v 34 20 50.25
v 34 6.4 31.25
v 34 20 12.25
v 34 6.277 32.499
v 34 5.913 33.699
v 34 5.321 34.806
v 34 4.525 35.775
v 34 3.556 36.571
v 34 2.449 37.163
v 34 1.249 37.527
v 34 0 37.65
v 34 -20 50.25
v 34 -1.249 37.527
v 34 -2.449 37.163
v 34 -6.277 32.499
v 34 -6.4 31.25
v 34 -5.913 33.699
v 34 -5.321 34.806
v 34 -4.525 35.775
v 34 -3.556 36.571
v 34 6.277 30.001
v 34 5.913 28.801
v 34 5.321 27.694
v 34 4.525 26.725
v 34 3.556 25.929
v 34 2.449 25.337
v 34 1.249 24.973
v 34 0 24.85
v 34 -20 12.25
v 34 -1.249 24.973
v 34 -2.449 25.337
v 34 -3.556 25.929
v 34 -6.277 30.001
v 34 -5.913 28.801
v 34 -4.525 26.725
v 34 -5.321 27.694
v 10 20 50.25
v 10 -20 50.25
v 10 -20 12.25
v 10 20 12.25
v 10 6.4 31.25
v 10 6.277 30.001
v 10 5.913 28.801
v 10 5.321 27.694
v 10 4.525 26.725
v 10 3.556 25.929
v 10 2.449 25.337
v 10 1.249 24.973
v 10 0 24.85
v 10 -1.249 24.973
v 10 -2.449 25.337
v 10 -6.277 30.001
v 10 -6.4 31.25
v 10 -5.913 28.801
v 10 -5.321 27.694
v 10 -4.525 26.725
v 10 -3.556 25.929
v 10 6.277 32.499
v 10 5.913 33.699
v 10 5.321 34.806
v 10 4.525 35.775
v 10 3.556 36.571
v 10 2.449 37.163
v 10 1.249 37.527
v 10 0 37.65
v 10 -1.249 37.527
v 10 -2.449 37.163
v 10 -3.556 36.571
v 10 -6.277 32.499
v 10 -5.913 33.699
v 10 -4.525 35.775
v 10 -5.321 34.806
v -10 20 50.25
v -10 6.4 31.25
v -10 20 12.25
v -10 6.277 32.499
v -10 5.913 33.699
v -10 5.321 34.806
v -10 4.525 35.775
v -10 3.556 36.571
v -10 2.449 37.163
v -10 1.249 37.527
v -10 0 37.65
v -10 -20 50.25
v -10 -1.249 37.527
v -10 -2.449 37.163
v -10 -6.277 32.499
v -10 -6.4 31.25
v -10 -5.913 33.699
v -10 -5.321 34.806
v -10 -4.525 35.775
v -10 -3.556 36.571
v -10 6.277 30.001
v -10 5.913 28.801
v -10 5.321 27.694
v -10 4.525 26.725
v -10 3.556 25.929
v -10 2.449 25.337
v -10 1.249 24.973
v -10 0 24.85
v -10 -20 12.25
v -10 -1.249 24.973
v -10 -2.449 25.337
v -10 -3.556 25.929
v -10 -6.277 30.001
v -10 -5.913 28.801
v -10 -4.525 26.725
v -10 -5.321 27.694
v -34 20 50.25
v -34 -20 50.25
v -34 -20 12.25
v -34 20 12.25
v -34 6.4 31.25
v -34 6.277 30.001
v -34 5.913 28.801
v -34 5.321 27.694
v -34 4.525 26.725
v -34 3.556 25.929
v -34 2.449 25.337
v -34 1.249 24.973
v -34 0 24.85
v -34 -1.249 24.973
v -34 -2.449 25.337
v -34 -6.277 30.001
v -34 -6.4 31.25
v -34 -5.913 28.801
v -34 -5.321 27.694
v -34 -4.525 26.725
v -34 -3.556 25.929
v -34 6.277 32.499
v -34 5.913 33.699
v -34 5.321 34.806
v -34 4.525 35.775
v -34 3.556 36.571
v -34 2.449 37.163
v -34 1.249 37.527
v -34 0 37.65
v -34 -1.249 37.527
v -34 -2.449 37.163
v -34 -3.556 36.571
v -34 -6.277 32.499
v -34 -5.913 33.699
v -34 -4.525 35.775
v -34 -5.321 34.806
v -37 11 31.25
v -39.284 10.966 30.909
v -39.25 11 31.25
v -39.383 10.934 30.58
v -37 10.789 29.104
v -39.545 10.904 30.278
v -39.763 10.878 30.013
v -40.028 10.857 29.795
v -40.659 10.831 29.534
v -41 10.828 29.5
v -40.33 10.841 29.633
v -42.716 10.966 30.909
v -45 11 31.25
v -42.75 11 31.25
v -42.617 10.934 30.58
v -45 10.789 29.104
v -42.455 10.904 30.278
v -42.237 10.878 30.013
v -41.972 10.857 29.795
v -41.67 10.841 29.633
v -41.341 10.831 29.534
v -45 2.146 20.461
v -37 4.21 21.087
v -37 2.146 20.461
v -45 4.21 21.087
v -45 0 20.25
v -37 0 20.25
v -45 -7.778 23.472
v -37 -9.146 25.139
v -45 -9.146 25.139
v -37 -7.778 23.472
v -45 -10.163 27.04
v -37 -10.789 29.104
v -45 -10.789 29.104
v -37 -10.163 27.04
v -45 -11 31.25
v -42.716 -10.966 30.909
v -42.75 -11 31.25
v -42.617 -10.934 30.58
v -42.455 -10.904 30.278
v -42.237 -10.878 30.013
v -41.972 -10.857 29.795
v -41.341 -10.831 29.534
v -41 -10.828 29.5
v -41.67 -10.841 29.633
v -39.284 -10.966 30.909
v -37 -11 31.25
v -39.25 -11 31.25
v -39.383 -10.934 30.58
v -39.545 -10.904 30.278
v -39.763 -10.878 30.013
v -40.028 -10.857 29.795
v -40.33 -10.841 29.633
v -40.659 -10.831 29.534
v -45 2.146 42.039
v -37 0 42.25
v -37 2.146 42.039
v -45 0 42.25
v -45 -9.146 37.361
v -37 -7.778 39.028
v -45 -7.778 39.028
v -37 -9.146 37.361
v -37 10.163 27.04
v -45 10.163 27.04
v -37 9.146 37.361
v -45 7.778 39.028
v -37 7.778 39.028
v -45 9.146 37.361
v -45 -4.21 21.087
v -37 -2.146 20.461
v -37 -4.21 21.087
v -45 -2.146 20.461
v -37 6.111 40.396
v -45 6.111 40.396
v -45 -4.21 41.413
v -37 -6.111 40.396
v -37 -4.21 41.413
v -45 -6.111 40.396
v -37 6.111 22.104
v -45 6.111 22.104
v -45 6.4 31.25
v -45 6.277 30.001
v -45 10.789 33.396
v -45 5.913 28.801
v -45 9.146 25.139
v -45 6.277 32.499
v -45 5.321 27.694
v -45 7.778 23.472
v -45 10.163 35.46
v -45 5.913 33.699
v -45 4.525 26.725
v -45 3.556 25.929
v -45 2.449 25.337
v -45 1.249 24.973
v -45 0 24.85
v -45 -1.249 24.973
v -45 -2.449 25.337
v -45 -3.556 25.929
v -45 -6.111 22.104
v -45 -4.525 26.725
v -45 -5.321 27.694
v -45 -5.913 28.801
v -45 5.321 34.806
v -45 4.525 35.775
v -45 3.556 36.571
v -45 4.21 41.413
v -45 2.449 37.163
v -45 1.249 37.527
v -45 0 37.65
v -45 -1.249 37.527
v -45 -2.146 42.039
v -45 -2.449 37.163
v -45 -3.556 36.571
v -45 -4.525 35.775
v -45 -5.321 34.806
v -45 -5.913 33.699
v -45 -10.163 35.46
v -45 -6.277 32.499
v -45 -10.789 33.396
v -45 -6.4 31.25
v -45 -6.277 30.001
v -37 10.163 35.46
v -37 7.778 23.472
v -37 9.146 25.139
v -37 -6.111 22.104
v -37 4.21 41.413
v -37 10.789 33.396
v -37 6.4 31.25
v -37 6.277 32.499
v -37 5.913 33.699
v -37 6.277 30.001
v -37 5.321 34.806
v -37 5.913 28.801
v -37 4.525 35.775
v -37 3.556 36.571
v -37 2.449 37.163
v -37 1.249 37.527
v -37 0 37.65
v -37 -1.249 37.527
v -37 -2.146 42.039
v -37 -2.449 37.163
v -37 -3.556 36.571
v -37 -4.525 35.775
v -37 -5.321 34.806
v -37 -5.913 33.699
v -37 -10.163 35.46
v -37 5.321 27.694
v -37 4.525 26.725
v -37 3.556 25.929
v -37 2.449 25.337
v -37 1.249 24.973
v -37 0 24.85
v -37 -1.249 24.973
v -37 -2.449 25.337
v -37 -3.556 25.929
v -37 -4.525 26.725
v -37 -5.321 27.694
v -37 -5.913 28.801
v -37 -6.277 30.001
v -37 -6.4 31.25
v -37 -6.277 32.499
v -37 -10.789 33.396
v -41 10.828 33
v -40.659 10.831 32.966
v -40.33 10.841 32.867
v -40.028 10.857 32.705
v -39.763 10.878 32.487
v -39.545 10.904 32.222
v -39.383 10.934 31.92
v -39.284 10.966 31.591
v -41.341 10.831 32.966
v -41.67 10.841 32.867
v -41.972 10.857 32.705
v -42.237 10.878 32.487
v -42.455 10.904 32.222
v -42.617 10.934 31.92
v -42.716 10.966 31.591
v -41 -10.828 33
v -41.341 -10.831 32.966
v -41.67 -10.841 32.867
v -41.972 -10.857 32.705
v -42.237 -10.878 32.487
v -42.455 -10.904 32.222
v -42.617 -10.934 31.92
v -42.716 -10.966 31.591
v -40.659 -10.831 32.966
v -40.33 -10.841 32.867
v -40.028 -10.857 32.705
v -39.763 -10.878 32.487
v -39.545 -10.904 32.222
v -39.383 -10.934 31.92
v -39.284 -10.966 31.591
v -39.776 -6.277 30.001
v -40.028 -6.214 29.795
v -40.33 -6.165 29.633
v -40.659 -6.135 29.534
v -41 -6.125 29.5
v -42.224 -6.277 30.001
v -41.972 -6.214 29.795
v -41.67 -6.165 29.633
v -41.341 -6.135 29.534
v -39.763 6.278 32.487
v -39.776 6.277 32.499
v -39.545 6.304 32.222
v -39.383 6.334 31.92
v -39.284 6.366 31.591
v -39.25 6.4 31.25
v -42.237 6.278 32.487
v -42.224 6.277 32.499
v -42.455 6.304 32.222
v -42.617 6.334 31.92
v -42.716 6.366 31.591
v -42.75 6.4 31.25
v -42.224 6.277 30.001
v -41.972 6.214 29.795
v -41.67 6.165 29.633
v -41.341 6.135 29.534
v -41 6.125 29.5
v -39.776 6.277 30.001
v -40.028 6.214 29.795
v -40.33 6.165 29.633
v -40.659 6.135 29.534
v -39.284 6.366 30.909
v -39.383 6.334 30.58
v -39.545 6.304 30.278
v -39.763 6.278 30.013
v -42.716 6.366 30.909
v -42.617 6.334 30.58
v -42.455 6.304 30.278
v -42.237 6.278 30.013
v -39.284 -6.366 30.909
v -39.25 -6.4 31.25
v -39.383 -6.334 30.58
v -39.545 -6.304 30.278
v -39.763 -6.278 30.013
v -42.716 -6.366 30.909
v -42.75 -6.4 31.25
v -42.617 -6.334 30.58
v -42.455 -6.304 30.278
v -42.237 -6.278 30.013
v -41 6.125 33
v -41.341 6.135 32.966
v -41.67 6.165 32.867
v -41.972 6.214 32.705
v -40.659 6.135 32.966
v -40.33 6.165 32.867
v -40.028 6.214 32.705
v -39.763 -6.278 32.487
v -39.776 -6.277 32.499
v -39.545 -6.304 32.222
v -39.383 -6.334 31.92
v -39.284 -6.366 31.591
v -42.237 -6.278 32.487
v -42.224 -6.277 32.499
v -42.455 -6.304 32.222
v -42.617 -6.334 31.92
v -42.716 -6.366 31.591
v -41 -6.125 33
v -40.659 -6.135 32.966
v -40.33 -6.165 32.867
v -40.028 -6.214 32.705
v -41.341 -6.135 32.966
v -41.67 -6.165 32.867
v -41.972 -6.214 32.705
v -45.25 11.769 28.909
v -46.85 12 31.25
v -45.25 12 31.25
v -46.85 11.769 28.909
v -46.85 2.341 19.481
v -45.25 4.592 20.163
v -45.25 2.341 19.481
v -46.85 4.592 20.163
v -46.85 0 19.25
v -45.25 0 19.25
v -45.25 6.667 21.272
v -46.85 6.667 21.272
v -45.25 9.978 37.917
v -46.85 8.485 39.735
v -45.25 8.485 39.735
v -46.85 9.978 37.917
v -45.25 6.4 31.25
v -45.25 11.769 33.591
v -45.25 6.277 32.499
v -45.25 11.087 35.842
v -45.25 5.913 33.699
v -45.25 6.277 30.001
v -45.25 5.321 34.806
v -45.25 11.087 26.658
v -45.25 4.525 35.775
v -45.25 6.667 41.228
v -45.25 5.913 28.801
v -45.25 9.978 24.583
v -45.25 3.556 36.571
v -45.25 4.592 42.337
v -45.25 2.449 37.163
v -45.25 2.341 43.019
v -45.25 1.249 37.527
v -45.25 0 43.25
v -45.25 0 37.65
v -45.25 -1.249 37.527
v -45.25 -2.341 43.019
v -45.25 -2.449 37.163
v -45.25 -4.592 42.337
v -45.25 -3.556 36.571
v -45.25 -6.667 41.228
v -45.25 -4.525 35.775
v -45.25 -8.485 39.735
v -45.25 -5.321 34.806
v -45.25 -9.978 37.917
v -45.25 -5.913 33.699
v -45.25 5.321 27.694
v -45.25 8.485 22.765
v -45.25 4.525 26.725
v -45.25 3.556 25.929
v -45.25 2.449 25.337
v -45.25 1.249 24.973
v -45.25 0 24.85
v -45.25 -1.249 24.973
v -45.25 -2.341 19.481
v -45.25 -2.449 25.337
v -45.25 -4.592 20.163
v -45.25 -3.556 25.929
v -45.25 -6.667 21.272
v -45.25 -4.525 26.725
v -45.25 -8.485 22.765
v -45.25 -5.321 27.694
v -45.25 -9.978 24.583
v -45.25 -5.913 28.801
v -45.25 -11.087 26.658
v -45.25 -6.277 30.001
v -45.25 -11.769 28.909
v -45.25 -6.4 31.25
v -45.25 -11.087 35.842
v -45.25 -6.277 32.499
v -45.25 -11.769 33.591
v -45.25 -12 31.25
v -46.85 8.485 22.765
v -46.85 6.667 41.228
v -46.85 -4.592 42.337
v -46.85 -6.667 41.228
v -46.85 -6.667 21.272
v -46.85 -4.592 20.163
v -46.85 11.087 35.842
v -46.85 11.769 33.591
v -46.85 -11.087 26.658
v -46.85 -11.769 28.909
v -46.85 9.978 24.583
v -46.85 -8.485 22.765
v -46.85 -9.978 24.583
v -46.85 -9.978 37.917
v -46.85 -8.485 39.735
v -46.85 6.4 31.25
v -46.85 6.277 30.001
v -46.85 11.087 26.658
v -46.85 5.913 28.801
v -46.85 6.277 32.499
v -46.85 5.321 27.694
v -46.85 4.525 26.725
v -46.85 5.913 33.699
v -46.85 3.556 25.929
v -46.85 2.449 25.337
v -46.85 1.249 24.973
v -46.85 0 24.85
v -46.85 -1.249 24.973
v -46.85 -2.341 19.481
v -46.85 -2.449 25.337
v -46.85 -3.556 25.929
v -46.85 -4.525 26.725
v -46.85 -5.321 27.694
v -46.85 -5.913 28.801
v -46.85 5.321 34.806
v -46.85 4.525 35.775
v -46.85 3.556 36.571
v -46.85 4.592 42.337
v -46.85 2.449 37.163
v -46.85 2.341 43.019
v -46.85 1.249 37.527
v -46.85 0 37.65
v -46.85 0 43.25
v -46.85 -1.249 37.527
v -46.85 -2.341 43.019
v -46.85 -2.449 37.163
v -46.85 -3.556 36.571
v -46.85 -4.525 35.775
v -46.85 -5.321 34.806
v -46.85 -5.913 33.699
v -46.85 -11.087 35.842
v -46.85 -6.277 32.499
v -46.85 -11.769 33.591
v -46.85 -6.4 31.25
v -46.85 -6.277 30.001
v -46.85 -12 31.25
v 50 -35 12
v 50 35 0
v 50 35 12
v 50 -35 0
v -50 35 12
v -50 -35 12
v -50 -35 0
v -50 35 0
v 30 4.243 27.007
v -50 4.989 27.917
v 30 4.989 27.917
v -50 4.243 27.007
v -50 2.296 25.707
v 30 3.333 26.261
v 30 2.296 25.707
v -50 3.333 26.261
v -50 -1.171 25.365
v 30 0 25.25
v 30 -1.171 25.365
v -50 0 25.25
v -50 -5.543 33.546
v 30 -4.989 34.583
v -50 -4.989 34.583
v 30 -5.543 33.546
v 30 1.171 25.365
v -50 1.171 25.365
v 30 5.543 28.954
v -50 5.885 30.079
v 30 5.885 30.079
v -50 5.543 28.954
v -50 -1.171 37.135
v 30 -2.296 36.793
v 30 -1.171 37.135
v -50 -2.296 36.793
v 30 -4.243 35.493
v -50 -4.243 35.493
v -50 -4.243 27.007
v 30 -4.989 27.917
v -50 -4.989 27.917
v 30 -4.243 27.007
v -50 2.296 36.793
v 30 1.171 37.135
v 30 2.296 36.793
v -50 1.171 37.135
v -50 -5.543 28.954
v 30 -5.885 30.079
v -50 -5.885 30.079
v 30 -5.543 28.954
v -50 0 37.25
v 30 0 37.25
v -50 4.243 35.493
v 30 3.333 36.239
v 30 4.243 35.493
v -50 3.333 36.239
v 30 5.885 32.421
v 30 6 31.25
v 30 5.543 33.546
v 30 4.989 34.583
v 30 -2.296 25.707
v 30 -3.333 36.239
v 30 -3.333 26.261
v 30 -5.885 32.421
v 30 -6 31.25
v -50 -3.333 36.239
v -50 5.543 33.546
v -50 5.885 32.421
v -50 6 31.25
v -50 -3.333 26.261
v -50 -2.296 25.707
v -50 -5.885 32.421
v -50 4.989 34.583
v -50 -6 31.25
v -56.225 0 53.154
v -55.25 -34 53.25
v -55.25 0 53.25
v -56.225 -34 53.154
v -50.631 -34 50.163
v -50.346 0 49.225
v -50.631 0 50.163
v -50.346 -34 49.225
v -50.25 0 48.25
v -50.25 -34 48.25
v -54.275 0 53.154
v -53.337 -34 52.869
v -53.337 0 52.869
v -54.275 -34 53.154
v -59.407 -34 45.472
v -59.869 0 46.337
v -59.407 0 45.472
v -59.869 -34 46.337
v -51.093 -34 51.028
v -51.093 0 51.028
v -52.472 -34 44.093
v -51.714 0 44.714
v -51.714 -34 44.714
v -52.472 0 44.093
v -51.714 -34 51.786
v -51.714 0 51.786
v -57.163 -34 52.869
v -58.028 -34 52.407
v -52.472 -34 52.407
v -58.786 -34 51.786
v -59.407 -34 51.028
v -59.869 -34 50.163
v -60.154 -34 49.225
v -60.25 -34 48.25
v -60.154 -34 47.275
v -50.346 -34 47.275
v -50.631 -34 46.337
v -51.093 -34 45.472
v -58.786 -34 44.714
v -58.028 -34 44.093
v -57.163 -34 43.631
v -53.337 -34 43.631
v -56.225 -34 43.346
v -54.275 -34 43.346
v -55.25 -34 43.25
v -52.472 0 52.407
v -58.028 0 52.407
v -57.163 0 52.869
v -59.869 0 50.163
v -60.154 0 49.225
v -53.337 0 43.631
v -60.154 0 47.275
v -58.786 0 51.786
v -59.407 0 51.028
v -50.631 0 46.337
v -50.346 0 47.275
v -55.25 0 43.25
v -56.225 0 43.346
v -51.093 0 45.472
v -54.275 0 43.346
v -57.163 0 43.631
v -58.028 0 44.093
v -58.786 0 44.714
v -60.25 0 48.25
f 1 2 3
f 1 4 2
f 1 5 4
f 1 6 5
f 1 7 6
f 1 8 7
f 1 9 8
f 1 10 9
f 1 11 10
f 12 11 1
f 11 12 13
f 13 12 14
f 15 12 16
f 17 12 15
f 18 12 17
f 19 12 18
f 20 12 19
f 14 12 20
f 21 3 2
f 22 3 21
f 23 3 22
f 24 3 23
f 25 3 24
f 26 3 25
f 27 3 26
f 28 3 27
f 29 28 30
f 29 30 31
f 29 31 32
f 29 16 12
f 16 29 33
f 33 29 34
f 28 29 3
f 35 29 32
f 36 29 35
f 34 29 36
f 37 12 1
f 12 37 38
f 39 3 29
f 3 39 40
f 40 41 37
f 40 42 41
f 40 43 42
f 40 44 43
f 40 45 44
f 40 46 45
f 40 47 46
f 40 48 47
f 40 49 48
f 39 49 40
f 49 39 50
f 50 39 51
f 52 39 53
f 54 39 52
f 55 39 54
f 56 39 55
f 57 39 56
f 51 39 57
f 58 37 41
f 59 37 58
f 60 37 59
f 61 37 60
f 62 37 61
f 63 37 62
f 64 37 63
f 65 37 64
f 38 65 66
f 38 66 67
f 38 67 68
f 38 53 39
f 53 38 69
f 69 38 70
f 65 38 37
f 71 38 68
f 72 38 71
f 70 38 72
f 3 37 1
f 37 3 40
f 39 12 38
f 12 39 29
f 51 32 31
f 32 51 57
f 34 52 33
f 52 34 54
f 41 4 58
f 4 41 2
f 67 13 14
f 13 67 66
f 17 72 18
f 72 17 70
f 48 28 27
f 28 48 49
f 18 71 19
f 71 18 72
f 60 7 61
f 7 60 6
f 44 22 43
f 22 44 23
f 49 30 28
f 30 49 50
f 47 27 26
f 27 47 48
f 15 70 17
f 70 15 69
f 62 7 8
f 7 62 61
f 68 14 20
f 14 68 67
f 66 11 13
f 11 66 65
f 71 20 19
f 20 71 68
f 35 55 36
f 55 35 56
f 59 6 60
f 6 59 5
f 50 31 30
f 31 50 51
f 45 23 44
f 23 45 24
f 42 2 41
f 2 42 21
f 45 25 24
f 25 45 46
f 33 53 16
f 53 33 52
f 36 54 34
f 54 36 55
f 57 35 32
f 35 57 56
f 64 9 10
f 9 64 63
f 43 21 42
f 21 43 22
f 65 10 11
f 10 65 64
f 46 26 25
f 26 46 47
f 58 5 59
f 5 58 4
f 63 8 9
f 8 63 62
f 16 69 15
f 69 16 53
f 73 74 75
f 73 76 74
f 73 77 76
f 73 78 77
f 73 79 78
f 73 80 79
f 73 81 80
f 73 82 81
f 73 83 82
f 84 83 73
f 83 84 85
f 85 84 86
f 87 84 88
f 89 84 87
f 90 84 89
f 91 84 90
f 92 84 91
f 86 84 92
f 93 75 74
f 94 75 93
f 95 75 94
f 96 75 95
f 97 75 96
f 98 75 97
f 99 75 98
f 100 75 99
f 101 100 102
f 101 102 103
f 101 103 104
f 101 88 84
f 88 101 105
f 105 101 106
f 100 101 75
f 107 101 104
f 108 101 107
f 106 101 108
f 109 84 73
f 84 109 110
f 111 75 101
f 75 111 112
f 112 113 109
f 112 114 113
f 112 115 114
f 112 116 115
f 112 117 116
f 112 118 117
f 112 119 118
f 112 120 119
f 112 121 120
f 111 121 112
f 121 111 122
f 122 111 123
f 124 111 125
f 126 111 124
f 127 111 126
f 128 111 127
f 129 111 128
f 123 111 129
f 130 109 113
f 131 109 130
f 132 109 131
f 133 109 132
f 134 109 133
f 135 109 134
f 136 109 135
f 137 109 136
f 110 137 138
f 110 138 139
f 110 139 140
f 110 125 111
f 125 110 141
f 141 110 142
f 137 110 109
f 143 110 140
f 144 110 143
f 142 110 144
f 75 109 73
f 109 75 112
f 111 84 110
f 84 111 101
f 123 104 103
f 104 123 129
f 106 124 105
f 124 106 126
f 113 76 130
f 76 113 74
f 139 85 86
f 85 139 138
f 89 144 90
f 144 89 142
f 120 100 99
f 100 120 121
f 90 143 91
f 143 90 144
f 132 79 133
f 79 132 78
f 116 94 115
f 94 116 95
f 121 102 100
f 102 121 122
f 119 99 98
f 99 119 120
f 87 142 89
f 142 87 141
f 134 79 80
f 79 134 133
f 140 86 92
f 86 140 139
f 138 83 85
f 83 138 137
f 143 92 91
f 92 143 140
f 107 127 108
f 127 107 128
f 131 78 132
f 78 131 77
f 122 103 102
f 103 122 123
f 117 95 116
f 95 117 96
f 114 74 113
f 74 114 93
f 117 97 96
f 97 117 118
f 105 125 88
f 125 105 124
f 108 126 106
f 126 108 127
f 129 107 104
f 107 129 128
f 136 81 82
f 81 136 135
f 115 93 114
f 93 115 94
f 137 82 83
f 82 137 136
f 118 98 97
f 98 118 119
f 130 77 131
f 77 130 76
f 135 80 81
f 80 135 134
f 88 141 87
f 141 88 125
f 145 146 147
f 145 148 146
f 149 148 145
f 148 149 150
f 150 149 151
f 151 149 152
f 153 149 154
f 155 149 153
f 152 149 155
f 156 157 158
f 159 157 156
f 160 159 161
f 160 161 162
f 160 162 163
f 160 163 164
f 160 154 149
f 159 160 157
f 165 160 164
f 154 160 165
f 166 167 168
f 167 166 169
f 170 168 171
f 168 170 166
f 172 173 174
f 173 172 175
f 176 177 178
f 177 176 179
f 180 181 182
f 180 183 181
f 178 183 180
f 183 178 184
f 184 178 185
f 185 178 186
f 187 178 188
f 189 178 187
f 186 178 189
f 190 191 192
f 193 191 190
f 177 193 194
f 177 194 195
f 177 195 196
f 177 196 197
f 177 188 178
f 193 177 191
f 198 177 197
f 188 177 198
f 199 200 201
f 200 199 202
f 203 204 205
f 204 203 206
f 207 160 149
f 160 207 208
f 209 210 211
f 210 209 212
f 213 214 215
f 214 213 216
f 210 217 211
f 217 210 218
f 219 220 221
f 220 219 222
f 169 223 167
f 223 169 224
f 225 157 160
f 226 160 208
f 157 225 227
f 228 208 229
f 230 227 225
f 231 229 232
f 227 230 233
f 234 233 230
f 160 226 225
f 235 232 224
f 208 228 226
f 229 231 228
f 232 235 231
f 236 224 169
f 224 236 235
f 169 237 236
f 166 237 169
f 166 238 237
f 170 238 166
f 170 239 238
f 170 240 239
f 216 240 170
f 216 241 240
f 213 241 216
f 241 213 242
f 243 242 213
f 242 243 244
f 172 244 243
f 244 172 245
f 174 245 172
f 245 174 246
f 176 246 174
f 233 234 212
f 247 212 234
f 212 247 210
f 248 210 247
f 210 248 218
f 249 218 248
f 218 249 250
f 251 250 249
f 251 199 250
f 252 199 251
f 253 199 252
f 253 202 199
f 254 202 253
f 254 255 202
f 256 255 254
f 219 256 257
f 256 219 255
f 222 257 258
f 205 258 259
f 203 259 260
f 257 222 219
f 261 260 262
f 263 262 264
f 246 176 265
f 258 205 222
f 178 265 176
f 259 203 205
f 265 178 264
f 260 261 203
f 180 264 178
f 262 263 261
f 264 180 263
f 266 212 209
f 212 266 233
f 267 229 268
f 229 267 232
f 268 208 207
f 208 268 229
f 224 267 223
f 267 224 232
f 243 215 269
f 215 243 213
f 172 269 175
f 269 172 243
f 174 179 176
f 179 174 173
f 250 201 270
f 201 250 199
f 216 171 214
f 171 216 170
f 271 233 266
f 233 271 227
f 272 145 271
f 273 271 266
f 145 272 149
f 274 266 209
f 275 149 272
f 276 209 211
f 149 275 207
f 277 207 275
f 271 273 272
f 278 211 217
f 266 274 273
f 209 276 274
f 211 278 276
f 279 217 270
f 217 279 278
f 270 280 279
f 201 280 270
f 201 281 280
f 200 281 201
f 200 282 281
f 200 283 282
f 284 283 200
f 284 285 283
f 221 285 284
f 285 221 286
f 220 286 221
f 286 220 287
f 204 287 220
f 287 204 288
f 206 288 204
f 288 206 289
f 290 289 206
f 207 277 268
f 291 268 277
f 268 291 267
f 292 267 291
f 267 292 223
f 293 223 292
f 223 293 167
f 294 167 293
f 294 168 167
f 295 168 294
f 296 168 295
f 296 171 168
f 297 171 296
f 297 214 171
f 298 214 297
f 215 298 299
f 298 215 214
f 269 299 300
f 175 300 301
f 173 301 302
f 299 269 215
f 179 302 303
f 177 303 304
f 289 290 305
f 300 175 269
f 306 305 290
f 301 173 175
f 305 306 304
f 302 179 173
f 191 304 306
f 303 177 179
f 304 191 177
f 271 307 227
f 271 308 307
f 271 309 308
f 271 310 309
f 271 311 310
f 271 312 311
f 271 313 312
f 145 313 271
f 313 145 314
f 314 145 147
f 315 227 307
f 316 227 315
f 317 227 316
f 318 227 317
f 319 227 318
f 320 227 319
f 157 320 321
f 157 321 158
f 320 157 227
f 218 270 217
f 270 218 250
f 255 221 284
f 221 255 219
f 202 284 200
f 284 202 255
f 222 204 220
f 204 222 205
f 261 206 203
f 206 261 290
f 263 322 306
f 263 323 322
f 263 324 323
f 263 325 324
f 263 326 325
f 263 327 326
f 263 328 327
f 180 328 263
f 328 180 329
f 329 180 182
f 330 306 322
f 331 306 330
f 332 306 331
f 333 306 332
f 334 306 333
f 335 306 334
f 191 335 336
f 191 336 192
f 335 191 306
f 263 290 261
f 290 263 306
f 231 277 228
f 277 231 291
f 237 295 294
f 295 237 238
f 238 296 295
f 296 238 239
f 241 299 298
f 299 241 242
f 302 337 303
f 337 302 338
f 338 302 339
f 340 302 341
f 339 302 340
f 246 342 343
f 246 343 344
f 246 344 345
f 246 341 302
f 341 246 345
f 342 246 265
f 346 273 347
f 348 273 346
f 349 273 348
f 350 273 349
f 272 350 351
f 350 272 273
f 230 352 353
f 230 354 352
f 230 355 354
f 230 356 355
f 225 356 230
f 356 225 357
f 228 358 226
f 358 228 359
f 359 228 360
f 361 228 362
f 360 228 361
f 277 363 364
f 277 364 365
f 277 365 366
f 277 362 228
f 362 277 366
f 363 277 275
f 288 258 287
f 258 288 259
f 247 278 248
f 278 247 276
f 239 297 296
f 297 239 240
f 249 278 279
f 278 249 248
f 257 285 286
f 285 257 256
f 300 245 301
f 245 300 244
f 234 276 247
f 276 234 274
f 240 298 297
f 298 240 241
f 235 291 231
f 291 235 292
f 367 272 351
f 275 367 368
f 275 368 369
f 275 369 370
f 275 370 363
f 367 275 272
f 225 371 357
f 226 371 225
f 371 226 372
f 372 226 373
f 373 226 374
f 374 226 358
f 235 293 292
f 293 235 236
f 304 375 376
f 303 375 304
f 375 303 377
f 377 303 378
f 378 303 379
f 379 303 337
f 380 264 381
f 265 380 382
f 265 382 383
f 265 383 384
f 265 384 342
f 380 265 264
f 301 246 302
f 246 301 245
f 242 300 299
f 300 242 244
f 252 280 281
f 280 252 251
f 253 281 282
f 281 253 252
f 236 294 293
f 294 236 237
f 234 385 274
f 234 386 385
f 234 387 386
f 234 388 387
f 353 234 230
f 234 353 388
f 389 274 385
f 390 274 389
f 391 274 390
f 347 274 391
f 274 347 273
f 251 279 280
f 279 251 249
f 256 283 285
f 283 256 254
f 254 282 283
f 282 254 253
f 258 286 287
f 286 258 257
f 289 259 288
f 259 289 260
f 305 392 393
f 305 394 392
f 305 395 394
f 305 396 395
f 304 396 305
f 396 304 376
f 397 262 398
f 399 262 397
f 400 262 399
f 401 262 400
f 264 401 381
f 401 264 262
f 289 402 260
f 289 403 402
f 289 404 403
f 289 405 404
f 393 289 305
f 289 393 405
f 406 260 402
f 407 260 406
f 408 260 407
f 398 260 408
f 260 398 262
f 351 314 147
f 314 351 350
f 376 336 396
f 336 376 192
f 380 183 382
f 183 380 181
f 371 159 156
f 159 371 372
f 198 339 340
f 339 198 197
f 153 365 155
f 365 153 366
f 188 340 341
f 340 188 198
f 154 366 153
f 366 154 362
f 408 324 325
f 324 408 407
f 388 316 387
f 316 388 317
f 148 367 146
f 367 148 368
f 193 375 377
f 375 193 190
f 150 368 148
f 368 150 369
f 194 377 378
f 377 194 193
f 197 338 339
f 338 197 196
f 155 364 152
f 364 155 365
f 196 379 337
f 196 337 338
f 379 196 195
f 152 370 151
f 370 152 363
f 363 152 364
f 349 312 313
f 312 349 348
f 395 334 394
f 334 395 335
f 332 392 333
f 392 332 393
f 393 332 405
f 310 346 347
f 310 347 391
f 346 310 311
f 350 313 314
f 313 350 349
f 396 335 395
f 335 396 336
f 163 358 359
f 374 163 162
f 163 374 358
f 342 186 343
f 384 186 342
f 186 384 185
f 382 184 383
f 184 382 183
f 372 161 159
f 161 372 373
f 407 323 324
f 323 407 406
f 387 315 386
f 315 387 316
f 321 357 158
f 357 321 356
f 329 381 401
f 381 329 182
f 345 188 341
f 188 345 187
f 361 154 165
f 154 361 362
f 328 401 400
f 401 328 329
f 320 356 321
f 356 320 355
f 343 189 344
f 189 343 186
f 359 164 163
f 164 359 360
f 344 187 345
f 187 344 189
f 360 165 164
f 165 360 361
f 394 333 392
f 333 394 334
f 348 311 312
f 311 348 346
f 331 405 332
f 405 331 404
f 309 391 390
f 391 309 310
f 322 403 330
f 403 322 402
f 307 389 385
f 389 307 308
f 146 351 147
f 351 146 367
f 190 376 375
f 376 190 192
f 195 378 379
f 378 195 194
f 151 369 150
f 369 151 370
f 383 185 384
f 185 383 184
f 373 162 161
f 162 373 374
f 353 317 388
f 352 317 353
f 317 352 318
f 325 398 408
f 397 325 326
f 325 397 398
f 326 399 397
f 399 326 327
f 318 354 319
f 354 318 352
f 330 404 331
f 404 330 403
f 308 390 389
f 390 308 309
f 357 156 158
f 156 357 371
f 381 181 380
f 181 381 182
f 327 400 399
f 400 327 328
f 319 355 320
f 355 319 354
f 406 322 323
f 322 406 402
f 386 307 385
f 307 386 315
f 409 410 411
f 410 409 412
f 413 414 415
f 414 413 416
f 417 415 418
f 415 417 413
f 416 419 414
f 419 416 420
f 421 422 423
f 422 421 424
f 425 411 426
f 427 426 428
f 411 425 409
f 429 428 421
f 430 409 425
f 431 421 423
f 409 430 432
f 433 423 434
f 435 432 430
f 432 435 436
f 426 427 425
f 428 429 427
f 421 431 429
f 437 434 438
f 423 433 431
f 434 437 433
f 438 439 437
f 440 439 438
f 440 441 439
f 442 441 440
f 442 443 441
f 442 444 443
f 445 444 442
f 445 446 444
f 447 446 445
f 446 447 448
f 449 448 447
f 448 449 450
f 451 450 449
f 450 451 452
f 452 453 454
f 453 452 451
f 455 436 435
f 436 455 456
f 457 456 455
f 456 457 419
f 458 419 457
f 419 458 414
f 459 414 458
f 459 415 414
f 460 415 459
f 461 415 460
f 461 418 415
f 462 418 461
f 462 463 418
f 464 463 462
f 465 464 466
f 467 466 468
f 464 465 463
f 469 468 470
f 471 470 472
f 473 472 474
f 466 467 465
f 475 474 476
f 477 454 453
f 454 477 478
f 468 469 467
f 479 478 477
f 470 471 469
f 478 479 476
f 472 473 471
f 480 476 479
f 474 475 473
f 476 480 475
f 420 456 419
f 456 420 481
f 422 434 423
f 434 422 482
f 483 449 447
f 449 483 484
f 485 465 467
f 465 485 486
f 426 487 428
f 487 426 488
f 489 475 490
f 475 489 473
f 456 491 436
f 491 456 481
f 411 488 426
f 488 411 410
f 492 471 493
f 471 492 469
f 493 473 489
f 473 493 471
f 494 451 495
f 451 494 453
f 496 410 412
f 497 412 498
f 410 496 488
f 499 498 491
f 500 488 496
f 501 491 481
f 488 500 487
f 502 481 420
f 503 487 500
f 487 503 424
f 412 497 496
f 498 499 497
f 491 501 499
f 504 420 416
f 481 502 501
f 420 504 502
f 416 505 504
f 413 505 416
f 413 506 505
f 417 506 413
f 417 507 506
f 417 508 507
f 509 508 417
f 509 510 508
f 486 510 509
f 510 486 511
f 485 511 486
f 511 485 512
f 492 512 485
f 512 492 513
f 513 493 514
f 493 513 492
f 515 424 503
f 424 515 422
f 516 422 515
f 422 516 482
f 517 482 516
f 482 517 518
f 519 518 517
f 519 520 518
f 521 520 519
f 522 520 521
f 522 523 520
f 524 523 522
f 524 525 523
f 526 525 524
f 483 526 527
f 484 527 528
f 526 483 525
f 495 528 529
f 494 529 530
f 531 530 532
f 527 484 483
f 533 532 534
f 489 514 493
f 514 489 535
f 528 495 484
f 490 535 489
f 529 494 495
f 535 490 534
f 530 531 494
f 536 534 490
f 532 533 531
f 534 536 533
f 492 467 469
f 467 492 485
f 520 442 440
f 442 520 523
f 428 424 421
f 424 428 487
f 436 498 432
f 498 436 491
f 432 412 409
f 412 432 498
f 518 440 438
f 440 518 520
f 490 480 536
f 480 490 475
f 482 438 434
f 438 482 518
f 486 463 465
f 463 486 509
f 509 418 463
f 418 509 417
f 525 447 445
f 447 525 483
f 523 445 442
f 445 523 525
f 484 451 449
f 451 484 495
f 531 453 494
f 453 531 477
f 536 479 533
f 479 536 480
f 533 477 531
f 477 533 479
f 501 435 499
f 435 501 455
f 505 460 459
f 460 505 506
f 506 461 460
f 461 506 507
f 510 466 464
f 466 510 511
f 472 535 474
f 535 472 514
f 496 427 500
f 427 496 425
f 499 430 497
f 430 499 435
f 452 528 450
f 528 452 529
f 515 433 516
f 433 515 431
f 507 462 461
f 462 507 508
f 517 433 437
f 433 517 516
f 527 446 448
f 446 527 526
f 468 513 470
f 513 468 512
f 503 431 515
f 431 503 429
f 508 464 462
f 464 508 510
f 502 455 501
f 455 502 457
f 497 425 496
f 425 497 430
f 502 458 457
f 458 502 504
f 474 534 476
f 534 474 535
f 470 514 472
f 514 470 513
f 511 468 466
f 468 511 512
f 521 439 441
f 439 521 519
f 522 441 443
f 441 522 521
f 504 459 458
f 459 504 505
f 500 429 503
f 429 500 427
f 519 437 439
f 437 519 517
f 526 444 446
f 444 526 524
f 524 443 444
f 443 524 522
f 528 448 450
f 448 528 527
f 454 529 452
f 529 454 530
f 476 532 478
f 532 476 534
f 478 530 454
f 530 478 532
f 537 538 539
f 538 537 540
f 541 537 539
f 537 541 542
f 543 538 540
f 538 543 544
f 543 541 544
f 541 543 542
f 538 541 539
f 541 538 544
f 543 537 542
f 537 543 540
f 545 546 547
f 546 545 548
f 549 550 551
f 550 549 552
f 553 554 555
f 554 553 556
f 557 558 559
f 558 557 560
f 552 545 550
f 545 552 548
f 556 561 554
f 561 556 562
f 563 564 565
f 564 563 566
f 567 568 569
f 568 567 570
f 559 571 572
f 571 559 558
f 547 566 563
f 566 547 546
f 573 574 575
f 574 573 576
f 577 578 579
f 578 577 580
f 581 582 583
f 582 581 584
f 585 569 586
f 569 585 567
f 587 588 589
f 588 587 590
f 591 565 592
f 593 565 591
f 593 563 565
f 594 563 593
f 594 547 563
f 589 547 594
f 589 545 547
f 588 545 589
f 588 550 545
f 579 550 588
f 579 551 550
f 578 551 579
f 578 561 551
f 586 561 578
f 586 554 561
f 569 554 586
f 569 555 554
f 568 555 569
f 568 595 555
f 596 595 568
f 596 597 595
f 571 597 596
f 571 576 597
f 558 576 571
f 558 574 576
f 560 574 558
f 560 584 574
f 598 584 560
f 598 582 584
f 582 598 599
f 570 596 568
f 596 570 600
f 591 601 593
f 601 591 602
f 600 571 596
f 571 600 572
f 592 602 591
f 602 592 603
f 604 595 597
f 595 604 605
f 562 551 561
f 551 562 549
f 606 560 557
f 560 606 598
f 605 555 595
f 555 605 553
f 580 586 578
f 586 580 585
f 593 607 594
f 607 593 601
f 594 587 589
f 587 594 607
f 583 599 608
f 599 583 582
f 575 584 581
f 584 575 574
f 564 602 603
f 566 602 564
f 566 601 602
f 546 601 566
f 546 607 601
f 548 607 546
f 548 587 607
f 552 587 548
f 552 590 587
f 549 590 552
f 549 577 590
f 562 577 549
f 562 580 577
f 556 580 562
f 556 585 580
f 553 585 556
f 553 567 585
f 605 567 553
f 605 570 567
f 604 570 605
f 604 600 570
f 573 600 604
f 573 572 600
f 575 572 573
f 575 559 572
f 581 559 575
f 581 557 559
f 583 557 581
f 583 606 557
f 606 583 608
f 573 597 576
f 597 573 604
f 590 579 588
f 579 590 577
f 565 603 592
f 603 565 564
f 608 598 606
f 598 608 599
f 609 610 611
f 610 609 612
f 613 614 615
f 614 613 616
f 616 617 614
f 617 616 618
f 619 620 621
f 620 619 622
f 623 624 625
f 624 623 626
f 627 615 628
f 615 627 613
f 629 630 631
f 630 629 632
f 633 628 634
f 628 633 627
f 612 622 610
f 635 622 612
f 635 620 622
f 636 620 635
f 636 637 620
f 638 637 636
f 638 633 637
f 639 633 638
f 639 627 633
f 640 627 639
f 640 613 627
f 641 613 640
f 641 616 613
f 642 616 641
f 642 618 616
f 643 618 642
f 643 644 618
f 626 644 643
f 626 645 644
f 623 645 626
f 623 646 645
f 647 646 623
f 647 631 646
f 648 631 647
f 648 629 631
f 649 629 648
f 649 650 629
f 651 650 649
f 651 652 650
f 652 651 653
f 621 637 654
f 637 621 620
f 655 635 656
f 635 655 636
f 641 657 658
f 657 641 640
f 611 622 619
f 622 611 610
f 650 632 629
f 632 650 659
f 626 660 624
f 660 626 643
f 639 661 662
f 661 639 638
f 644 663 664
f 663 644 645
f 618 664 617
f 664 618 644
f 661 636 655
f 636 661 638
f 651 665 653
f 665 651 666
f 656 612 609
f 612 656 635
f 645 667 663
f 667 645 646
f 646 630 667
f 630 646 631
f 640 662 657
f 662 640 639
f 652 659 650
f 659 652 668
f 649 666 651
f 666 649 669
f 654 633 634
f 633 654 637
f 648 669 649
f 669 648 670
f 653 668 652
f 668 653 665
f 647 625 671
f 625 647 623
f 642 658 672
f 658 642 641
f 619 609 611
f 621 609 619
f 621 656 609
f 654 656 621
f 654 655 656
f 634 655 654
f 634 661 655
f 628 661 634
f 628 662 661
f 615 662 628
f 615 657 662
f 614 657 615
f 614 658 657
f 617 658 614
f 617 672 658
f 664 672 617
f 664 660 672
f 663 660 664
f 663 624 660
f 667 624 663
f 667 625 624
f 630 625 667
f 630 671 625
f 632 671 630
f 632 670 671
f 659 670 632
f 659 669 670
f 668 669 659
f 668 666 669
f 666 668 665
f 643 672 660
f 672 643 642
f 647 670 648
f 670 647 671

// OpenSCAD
$fn = 32;

// ------------------------------------------------------------------------
// Machine vise: screw d12, jaws 24 x 38 mm
// Every part is its own module, assembly() places every instance.
// ------------------------------------------------------------------------

// --- part 1 ---
module vise_bed() {
  difference() {
    translate([-50, -35, 0]) cube([100, 70, 12]);
  }
}

// --- part 2 ---
module vise_jaw() {
  difference() {
    translate([-12, -20, 0]) cube([24, 40, 38]);
    translate([0, 0, 19]) rotate([0, 90, 0]) cylinder(h = 26, d = 12.8, center = true);
  }
}

// --- part 3 ---
module vise_screw() {
  translate([0, 0, -40]) cylinder(h = 80, d = 12);
}

// --- part 4 ---
module screw_collar() {
  difference() {
    cylinder(h = 8, d = 22);
    translate([0, 0, -1]) cylinder(h = 10, d = 12.8);
    translate([0, 0, 4]) rotate([90, 0, 0]) cylinder(h = 24, d = 3.5, center = true);
  }
}

// --- part 5 ---
module screw_washer() {
  difference() {
      translate([0, 0, 0]) cylinder(h = 1.6, d = 24);
      translate([0, 0, -1]) cylinder(h = 3.6, d = 12.8);
    }
}

// --- part 6 ---
module vise_handle() {
  cylinder(h = 34, d = 10);
}

// --- assembly ---
module assembly() {
  color([0.80, 0.24, 0.20]) translate([0, 0, 0]) rotate([0, 0, 0]) vise_bed();
  color([0.20, 0.45, 0.75]) translate([22, 0, 12.25]) rotate([0, 0, 0]) vise_jaw();
  color([0.25, 0.62, 0.32]) translate([-22, 0, 12.25]) rotate([0, 0, 0]) vise_jaw();
  color([0.92, 0.70, 0.18]) translate([-10, 0, 31.25]) rotate([0, 90, 0]) vise_screw();
  color([0.58, 0.35, 0.70]) translate([-45, 0, 31.25]) rotate([0, 90, 0]) screw_collar();
  color([0.16, 0.66, 0.66]) translate([-46.85, 0, 31.25]) rotate([0, 90, 0]) screw_washer();
  color([0.85, 0.48, 0.18]) translate([-55.25, 0, 48.25]) rotate([90, 0, 0]) vise_handle();
}

assembly();
